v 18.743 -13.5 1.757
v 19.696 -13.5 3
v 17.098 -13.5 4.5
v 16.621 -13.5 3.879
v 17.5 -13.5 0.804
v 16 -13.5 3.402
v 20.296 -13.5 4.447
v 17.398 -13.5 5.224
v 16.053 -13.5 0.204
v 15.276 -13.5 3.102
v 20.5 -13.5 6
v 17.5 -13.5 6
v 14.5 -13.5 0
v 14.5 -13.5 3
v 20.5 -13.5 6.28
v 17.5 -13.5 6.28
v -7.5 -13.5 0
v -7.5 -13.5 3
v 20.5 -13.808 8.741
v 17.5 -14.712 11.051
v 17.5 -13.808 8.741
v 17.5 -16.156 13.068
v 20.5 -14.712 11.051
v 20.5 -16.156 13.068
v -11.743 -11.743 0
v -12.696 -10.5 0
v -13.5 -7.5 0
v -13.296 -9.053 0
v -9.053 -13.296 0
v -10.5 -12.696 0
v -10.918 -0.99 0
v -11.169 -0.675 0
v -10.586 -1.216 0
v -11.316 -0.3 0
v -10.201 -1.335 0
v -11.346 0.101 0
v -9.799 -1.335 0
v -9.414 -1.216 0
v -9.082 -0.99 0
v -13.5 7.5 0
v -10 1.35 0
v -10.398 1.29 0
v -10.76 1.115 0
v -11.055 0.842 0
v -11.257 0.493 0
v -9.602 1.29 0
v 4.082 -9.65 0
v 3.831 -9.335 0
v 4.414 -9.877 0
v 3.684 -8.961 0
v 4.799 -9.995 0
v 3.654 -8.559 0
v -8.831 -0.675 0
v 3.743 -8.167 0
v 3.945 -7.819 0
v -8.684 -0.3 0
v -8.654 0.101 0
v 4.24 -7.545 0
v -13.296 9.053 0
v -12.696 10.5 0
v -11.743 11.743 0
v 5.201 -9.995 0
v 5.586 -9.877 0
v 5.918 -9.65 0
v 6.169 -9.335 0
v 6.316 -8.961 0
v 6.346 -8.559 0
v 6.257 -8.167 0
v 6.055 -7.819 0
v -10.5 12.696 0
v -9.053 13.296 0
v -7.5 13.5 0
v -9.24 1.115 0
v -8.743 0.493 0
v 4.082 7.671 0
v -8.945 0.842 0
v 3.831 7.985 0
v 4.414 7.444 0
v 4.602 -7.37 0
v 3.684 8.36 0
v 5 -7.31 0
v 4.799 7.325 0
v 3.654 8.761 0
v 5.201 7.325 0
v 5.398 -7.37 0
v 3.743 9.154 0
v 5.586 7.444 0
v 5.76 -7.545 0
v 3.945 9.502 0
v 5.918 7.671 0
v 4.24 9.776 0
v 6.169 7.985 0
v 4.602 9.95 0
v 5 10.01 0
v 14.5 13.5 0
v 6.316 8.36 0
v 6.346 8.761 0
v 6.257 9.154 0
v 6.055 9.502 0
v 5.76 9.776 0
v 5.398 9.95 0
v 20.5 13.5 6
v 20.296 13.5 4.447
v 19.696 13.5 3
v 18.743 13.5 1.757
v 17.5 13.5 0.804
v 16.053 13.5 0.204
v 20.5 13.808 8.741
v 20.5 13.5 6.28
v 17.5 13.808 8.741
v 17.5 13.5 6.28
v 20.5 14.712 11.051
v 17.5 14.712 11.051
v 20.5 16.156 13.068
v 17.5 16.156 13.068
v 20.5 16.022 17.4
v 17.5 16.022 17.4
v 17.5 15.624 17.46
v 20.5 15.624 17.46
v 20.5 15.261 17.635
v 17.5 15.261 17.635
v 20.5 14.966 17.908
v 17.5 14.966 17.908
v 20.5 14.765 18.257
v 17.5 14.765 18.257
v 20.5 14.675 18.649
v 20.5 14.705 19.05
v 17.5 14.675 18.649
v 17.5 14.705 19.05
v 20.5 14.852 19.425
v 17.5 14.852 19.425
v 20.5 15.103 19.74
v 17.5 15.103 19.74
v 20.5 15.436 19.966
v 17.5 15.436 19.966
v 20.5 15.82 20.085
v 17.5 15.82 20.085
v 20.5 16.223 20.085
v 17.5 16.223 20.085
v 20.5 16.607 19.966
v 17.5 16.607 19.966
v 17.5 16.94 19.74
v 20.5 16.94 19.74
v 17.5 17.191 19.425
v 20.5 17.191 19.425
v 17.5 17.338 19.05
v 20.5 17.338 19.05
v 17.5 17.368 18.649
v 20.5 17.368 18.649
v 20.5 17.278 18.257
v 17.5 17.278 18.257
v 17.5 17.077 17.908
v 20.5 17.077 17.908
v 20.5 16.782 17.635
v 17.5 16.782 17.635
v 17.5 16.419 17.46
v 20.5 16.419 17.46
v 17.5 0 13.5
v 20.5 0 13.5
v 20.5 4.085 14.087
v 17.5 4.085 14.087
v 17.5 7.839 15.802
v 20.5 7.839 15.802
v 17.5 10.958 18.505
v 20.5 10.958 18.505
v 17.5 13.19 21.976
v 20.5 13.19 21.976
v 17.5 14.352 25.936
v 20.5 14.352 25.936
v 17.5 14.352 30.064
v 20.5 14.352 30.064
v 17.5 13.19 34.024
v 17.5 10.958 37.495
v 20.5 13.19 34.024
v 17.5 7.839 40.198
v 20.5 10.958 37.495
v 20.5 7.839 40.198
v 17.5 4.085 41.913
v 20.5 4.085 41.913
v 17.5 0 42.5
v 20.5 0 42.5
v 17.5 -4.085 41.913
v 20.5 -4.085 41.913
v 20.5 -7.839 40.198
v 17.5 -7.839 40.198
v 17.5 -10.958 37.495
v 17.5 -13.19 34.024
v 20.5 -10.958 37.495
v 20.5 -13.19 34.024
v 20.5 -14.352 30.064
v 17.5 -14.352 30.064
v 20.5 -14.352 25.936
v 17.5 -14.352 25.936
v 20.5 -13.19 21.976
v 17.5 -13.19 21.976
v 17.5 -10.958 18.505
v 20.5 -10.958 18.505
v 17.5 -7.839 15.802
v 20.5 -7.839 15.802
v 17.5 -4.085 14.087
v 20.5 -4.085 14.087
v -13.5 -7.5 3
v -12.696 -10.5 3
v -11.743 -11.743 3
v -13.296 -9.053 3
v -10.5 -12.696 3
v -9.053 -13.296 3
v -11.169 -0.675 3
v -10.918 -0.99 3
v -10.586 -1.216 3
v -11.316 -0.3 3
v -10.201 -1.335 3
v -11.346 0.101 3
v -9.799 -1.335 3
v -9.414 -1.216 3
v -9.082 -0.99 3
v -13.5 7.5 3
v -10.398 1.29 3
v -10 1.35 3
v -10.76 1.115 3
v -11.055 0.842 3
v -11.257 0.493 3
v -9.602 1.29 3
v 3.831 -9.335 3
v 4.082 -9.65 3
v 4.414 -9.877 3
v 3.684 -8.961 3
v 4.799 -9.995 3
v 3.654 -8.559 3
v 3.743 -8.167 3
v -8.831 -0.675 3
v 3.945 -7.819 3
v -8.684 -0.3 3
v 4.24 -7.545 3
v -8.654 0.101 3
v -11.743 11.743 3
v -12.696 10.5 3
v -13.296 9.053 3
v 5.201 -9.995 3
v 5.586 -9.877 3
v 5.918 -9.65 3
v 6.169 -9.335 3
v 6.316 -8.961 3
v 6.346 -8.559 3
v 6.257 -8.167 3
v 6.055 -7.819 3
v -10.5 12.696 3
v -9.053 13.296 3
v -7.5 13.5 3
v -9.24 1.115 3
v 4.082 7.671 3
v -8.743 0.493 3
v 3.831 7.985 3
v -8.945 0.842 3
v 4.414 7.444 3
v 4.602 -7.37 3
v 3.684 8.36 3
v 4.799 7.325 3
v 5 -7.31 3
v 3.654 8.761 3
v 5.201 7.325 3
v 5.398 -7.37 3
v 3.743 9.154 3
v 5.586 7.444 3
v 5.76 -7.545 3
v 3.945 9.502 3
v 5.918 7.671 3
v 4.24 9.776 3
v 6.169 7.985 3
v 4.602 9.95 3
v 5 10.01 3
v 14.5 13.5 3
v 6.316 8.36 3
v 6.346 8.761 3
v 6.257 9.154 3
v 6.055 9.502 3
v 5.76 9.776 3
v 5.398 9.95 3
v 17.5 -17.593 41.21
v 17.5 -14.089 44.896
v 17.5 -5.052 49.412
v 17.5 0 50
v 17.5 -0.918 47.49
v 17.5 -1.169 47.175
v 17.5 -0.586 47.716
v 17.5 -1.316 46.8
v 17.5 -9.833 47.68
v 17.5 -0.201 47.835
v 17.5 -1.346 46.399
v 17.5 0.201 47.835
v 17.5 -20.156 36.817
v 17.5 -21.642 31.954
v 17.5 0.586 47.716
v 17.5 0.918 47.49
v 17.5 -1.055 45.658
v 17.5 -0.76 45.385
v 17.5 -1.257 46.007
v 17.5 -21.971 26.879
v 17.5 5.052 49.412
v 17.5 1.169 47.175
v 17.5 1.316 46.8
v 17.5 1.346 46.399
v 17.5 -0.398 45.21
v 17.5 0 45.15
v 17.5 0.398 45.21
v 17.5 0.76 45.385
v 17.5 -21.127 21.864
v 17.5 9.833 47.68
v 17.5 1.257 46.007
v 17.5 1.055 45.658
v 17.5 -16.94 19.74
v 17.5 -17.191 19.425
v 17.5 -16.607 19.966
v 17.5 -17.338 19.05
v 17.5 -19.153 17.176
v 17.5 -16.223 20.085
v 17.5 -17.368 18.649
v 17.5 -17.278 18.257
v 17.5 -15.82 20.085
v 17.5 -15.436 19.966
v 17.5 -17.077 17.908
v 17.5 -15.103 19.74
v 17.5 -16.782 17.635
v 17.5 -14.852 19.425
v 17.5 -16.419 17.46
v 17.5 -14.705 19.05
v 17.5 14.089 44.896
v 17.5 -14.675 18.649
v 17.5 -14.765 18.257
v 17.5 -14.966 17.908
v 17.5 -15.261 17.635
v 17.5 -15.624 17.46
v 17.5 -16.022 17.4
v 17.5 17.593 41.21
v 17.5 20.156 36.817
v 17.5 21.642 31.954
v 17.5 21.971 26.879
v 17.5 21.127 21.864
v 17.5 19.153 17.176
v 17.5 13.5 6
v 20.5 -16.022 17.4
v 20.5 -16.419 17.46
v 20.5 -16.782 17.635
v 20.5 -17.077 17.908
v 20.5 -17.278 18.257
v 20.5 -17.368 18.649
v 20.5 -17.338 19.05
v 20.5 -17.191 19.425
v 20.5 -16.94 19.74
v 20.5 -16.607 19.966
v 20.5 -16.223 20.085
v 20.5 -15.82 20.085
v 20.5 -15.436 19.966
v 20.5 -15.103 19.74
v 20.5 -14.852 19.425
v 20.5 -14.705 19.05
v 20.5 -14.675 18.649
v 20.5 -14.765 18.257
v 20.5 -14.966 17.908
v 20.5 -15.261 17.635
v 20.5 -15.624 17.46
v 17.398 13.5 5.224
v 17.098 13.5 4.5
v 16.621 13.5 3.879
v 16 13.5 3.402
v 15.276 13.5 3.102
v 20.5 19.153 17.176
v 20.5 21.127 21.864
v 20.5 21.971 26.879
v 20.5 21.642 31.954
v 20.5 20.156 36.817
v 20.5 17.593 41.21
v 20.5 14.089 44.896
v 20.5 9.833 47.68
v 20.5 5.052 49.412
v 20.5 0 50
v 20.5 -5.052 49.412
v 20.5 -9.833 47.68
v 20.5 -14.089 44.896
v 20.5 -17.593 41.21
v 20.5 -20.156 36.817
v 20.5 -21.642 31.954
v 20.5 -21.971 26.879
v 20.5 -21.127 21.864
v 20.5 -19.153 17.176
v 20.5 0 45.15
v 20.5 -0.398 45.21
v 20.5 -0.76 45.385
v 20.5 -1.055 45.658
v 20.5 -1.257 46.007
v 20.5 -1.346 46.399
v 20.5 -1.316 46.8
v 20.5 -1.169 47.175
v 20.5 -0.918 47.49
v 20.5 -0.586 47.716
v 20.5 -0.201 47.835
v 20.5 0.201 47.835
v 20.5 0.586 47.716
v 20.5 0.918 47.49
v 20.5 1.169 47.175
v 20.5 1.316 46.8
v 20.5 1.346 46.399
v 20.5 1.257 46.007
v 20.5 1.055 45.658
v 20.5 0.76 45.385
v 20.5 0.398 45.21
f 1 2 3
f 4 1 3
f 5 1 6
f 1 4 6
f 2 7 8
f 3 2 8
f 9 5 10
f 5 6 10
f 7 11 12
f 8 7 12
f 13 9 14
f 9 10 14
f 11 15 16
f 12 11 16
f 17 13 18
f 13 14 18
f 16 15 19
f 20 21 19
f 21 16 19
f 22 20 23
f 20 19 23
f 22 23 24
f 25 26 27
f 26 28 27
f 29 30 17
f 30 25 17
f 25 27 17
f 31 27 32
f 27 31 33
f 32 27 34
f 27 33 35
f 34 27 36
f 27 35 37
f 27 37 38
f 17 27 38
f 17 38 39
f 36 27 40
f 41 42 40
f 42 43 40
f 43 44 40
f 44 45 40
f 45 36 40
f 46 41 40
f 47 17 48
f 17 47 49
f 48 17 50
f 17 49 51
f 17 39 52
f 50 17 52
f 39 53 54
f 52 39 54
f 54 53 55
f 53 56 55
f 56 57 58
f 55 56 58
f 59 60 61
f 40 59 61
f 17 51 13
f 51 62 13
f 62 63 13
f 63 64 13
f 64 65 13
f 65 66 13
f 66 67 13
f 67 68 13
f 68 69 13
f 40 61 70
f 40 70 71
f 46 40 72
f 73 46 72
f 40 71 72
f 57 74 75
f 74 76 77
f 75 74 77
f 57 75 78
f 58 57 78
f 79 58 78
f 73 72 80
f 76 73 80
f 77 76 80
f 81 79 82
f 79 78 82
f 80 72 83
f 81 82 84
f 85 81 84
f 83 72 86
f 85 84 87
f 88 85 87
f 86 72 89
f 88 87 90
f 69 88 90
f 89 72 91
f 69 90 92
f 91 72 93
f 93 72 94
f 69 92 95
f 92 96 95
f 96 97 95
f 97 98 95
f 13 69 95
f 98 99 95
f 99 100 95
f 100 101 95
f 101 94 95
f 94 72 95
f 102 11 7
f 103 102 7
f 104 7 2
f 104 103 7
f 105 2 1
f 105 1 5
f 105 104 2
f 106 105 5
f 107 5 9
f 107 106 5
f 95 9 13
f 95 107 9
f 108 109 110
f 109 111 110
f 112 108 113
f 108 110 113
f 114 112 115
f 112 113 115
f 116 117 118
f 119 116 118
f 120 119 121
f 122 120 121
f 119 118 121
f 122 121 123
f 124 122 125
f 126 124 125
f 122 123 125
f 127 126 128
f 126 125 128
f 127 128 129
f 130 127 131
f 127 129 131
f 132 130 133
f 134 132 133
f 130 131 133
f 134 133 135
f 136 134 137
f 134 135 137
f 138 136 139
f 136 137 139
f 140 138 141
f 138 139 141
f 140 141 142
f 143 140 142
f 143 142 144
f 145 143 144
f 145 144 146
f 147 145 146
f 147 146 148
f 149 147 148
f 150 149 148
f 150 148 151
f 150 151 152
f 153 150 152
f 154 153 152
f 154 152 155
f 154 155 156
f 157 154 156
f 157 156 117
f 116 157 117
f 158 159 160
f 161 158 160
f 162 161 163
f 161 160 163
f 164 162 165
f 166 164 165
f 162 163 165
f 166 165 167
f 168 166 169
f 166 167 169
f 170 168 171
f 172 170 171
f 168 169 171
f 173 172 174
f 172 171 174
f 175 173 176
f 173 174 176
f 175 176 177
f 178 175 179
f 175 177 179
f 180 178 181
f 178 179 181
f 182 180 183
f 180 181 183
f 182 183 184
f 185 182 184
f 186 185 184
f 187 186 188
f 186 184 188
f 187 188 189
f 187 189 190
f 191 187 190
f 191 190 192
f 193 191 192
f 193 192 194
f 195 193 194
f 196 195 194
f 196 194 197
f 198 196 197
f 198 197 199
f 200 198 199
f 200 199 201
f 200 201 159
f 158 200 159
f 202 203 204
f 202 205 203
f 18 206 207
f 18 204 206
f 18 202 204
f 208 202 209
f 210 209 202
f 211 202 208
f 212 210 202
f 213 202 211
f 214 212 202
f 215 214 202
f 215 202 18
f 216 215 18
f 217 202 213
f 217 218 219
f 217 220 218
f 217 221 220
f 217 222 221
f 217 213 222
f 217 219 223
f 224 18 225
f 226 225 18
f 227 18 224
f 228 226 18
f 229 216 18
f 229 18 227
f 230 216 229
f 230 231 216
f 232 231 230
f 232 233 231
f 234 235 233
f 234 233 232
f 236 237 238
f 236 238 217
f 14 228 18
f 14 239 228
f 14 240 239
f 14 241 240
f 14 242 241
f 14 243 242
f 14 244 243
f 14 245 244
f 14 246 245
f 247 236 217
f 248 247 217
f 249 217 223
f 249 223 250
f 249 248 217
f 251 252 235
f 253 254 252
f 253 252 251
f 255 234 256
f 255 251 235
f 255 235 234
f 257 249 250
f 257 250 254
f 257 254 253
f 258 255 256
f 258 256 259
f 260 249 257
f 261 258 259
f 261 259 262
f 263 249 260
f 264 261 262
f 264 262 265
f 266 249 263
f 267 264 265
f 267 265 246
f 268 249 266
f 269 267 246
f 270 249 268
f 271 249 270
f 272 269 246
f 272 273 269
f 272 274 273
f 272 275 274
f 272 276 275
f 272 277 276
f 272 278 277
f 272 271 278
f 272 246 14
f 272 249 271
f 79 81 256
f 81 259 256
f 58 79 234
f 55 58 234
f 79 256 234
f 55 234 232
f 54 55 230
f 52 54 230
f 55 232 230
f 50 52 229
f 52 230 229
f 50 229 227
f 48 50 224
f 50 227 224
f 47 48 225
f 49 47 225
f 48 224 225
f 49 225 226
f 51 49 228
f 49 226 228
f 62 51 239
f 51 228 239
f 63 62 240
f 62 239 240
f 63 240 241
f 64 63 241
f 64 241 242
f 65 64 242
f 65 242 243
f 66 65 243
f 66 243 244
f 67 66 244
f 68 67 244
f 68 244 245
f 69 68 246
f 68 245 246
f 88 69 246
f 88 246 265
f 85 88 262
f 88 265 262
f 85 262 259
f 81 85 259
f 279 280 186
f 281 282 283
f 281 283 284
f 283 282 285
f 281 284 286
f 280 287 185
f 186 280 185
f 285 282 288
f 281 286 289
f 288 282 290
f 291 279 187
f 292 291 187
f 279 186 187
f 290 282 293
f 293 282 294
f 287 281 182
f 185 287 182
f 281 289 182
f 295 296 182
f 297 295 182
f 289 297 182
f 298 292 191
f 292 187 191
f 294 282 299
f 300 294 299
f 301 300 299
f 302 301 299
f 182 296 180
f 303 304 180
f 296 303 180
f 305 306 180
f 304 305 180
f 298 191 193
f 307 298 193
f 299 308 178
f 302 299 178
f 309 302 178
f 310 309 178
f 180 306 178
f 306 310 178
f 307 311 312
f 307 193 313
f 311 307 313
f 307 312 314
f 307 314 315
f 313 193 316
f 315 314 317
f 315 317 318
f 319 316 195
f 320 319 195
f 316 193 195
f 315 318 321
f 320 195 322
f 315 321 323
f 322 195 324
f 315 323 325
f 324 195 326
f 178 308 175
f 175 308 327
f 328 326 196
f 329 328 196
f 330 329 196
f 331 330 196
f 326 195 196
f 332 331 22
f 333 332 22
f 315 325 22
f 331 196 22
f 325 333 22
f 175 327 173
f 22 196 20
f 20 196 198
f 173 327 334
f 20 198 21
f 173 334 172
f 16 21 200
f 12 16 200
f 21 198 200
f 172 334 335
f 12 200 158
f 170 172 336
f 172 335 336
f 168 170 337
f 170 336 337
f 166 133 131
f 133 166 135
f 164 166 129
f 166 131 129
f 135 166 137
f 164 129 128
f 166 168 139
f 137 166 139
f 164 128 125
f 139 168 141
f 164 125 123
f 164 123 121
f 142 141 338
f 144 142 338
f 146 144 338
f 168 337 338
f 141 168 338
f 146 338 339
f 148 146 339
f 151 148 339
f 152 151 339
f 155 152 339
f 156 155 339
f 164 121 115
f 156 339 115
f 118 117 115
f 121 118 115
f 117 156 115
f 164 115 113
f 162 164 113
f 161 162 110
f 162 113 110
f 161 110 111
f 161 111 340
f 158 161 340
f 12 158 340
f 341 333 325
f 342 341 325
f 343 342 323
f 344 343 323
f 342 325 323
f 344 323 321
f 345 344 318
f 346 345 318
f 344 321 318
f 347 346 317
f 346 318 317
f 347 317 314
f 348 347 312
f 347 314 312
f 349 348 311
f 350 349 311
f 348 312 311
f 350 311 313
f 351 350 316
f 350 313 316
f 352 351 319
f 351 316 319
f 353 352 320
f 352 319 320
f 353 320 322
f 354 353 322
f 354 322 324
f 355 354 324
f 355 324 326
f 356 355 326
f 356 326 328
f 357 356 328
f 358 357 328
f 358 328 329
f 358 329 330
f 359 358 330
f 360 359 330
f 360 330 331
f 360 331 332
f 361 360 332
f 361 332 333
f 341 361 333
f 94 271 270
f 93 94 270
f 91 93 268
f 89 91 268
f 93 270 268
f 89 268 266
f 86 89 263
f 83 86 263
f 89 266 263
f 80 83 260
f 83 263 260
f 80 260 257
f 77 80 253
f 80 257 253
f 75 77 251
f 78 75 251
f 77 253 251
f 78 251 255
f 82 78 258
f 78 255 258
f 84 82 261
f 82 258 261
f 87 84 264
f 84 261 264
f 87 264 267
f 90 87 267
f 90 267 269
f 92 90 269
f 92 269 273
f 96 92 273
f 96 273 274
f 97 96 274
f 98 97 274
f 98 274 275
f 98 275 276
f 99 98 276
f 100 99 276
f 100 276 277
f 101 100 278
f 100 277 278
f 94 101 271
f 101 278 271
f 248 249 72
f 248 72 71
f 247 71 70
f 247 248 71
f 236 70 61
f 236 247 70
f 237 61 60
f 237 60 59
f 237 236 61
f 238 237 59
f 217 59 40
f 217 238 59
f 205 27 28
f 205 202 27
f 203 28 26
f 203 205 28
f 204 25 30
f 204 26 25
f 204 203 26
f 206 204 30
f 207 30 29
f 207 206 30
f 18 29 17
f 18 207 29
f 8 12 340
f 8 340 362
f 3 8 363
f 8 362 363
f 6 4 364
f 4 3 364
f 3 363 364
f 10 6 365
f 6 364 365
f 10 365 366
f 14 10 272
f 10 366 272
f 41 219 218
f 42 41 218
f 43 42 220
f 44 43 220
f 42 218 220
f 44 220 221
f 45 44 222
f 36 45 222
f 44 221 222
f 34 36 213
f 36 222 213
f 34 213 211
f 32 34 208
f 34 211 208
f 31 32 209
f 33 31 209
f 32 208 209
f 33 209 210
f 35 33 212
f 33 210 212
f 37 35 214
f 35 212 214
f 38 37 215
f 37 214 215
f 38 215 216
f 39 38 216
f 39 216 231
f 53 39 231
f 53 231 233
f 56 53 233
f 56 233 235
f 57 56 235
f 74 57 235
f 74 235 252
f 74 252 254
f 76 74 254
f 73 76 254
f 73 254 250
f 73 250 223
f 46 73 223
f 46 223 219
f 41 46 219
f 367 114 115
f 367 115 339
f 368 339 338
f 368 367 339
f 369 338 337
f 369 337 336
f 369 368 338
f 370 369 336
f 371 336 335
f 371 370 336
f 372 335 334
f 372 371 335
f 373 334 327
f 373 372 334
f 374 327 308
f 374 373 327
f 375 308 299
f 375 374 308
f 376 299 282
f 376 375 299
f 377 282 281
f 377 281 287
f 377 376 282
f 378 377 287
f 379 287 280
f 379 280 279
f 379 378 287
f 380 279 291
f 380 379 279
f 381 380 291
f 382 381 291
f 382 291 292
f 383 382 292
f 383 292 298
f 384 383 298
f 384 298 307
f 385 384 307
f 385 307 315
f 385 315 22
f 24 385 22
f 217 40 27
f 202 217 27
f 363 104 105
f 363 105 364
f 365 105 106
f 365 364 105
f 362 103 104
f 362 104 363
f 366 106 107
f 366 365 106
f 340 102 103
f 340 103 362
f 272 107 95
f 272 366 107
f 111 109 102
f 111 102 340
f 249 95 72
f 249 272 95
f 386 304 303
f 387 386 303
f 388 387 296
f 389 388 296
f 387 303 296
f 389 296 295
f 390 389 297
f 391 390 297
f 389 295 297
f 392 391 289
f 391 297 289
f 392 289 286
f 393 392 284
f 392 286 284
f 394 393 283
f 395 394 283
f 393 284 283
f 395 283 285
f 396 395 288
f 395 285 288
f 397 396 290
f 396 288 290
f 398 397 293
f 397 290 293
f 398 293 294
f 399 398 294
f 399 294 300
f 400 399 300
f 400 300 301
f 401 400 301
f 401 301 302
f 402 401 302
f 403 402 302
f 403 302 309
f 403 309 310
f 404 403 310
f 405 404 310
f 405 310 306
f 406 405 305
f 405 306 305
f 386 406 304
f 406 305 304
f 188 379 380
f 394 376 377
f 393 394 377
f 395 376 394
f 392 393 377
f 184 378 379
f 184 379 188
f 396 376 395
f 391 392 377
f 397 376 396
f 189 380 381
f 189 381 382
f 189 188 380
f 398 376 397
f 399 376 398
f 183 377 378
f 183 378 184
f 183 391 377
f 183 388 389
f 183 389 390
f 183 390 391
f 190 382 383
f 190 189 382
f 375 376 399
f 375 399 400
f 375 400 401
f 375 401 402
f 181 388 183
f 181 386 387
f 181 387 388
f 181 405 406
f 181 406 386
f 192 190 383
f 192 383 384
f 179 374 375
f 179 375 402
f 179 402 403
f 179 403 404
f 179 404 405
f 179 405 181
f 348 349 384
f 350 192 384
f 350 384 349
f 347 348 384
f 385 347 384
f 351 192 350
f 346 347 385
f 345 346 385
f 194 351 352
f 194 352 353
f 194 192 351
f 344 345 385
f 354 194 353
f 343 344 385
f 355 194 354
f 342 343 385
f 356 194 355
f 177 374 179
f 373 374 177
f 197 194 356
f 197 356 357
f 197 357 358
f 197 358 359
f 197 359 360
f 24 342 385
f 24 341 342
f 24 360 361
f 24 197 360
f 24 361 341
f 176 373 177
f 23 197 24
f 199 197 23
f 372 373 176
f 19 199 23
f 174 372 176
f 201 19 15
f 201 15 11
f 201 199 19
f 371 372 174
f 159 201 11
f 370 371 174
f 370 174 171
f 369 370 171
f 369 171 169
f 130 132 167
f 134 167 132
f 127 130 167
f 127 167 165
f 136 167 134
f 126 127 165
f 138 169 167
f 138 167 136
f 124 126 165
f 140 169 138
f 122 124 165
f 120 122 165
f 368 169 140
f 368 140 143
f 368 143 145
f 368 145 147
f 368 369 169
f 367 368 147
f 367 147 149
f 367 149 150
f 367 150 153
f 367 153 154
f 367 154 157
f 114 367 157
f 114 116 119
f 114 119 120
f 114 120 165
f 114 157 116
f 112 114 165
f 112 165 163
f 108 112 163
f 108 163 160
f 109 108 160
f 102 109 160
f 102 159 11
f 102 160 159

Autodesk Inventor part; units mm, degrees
ref_plane "YZ Plane" through (0, 0, 0) normal (1, 0, 0) x (0, 1, 0)
ref_plane "XZ Plane" through (0, 0, 0) normal (0, 1, 0) x (-1, 0, 0)
ref_plane "XY Plane" through (0, 0, 0) normal (0, 0, 1) x (1, 0, 0)
sketch "スケッチ1" plane through (0, 0, 0) normal (0, 0, 1) x (1, 0, 0)
  circle A0 centre (0, 0) radius 13.5
  line L0 (0, 13.5) -> (14.5, 13.5)
  line L1 (14.5, 13.5) -> (14.5, -13.5)
  line L2 (14.5, -13.5) -> (0, -13.5)
  line L3 (0, -13.5) -> (0, 13.5)
  line L4 (0, 0) -> (14.5, 0) construction
  point P0 (0, 13.5)
  point P1 (0, -13.5)
  point P2 (0, -13.5)
  dimension "d0" = 27
  dimension "d1" = 27
  dimension "d2" = 14.5
extrude "プレート1" add sketch "スケッチ1" along normal blind 3
sketch "スケッチ2" plane through (17.5, 13.5, 6) normal (1, 0, 0) x (0, 1, 0)
  line L0 (-27, 0) -> (0, 0)
  line L1 (0, 0) -> (0, 19)
  line L2 (0, 19) -> (-27, 19)
  line L3 (-27, 19) -> (-27, 0)
edge flange "フランジ1" height 25 angle 90 thickness 3 bend radius 3 thickness toward (1, 0, 0) relief tear relief width 3 relief depth 1.5 edges at (14.5, 0, 3) wall of the first edge with corners at (17.5, -13.5, 6) (17.5, 13.5, 6) (17.5, 13.5, 25) (17.5, -13.5, 25)
bend "曲げ1"
corner "コーナー1"
sketch "スケッチ3" plane through (0, 0, 0) normal (0, 0, -1) x (-1, 0, 0)
  point P0 (0, 0)
  point P1 (10, 0)
  point P2 (-5, 8.6603)
  point P3 (-5, -8.6603)
  dimension "d14" = 10
  dimension "d17" = 360
hole "穴1" at (-10, 0, 0) at (5, 8.6603, 0) at (5, -8.6603, 0) direction (0, 0, 1) diameter 2.7 depth 3
sketch "スケッチ4" plane through (20.5, -13.5, 25) normal (1, 0, 0) x (0, 0, -1)
  circle A0 centre (-3, 13.5) radius 22
  line L0 (25, 27) -> (25, 0) projected
  line L1 (0, 27) -> (19, 27) projected
  point P0 (25, 13.5)
  dimension "d26" = 44
  dimension "d29" = 28
  dimension "d46" = 13.5
extrude "押し出し1" add sketch "スケッチ4" against normal up to surface (3 mm away)
sketch "スケッチ5" plane through (20.5, -13.5, 6) normal (1, 0, 0) x (0, 0, -1)
  arc A0 (-4.629, 27) -> (-4.629, 0) centre (-22, 13.5) ccw projected
  circle A1 centre (-22, 13.5) radius 14.5
  point P0 (6, 13.5)
  dimension "d30" = 29
extrude "押し出し2" cut sketch "スケッチ5" against normal up to surface (3 mm away)
sketch "スケッチ6" plane through (20.5, 0, 28) normal (1, 0, 0) x (0, 0, 1)
  point P0 (-28, 0)
sketch "スケッチ7" plane through (20.5, -13.5, 6) normal (1, 0, 0) x (0, 0, -1)
  circle A0 centre (-22, 13.5) radius 14.5 projected
  point P0 (6, 13.5)
  point P1 (-40.5, 13.5)
  point P2 (-12.75, -2.5215)
  point P3 (-12.75, 29.5215)
  dimension "d33" = 18.5
  dimension "d36" = 360
hole "穴2" at (20.5, 0, 46.5) at (20.5, -16.0215, 18.75) at (20.5, 16.0215, 18.75) direction (-1, 0, 0) diameter 2.7 depth 3
fillet "フィレット1" radius 10 2 edges at (19, -13.5, 10.629) (19, 13.5, 10.629)
sketch "スケッチ8" plane through (0, 0, 0) normal (0, 0, -1) x (-1, 0, 0)
  line L0 (0, 13.5) -> (-14.5, 13.5) projected
  line L1 (0, 13.5) -> (13.5, 13.5)
  line L2 (13.5, 13.5) -> (13.5, -13.5)
  line L3 (13.5, -13.5) -> (0, -13.5)
  line L4 (0, -13.5) -> (0, 13.5)
  circle A0 centre (-5, -8.6603) radius 1.35 projected
  circle A1 centre (-5, 8.6603) radius 1.35 projected
  circle A2 centre (10, 0) radius 1.35 projected
  line L5 (0, 13.5) -> (-14.5, 13.5) projected
  line L6 (-14.5, 13.5) -> (-14.5, -13.5) projected
  line L7 (-14.5, -13.5) -> (0, -13.5) projected
  arc A3 (0, -13.5) -> (0, 13.5) centre (0, 0) ccw projected
  point P0 (13.5, 0)
  dimension "d47" = 13.5
  dimension "d48" = 27
extrude "押し出し3" add sketch "スケッチ8" against normal up to surface (3 mm away) contours L1 L2 A3 | A3 L2 L3
fillet "フィレット2" radius 6 2 edges at (-13.5, 13.5, 1.5) (-13.5, -13.5, 1.5)
equation "\"d24\" = Thickness"
equation "\"d3\" = Thickness"
equation "\"d4\" = BendReliefWidth"
equation "\"d5\" = BendReliefDepth"
equation "\"d6\" = MinimumRemnant"
equation "\"d7\" = TransitionRadius"
equation "\"d10\" = BendRadius"
equation "\"d11\" = CornerReliefSize"
equation "\"d12\" = GapSize"
equation "\"d13\" = JacobiRadiusSize"
equation "\"BendRadius\" = Thickness"
equation "\"BendReliefWidth\" = Thickness"
equation "\"BendReliefDepth\" = 0.5 * Thickness"
equation "\"CornerReliefSize\" = 4 * Thickness"
equation "\"MinimumRemnant\" = 2 * Thickness"
equation "\"TransitionRadius\" = BendRadius"
equation "\"JacobiRadiusSize\" = BendRadius"
equation "\"GapSize\" = Thickness"
equation "\"Thickness\" = 3"
properties part number "wrist_yaw_plate" material "アルミニウム 6061"
